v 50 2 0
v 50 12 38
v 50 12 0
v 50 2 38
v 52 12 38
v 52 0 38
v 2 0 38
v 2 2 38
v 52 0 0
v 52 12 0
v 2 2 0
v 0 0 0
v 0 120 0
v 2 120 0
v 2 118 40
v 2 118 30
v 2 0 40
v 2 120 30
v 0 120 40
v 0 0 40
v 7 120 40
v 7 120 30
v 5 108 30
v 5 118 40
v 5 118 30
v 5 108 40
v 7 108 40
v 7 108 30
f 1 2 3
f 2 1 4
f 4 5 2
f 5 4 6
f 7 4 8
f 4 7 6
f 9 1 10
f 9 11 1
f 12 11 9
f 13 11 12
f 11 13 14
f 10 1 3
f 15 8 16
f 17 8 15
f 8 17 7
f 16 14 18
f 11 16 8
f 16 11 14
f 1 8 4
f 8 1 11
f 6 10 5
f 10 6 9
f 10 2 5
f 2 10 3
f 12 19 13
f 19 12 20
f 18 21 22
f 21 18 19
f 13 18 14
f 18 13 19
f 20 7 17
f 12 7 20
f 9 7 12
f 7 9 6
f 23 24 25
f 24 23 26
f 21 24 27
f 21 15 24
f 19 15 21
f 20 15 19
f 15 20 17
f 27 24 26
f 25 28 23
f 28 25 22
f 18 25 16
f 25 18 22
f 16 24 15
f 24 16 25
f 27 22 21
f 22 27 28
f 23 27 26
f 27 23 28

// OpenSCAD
dishwasher_door_depth = 48;
dishwasher_door_inner_gap = 2;
dishwasher_door_inner_gap_height = 10;
dishwasher_door_upper_gap = 2;

diswasher_cover_depth = 3;

outside_wall_thickness = 2;
outside_wall_height = 120;

top_overhang_width = 38;
bottom_overhang_width = 10;
bottom_overhang_offset = 30;

// Model the dishwasher "door" so we can substract it from the model
module door(depth, width) {
    union() {
        cube([depth, outside_wall_height, width]);
        magic_offset_number = 2;
        translate([magic_offset_number, dishwasher_door_inner_gap_height, 0])
            cube([depth, outside_wall_height, width]);

    }
};

// We are going to use this for both the top and bottom overhang
module overhang(depth, width) {
    difference() {
        cube([
            outside_wall_thickness + depth + dishwasher_door_upper_gap,
            outside_wall_height,
            width
        ]);
        translate([outside_wall_thickness, dishwasher_door_upper_gap, 0])
            door(depth, width);
    }
}

// Overhang that goes over the top of the door and to the inside gap
module top_overhang() {
    overhang(dishwasher_door_depth, top_overhang_width);
}

module bottom_overhang() {
    mirror([0, 1, 0])
    translate([0,-outside_wall_height,bottom_overhang_offset])
        overhang(diswasher_cover_depth, bottom_overhang_width);
}

module attachment() {  
    top_overhang();
    bottom_overhang();
}

attachment();
